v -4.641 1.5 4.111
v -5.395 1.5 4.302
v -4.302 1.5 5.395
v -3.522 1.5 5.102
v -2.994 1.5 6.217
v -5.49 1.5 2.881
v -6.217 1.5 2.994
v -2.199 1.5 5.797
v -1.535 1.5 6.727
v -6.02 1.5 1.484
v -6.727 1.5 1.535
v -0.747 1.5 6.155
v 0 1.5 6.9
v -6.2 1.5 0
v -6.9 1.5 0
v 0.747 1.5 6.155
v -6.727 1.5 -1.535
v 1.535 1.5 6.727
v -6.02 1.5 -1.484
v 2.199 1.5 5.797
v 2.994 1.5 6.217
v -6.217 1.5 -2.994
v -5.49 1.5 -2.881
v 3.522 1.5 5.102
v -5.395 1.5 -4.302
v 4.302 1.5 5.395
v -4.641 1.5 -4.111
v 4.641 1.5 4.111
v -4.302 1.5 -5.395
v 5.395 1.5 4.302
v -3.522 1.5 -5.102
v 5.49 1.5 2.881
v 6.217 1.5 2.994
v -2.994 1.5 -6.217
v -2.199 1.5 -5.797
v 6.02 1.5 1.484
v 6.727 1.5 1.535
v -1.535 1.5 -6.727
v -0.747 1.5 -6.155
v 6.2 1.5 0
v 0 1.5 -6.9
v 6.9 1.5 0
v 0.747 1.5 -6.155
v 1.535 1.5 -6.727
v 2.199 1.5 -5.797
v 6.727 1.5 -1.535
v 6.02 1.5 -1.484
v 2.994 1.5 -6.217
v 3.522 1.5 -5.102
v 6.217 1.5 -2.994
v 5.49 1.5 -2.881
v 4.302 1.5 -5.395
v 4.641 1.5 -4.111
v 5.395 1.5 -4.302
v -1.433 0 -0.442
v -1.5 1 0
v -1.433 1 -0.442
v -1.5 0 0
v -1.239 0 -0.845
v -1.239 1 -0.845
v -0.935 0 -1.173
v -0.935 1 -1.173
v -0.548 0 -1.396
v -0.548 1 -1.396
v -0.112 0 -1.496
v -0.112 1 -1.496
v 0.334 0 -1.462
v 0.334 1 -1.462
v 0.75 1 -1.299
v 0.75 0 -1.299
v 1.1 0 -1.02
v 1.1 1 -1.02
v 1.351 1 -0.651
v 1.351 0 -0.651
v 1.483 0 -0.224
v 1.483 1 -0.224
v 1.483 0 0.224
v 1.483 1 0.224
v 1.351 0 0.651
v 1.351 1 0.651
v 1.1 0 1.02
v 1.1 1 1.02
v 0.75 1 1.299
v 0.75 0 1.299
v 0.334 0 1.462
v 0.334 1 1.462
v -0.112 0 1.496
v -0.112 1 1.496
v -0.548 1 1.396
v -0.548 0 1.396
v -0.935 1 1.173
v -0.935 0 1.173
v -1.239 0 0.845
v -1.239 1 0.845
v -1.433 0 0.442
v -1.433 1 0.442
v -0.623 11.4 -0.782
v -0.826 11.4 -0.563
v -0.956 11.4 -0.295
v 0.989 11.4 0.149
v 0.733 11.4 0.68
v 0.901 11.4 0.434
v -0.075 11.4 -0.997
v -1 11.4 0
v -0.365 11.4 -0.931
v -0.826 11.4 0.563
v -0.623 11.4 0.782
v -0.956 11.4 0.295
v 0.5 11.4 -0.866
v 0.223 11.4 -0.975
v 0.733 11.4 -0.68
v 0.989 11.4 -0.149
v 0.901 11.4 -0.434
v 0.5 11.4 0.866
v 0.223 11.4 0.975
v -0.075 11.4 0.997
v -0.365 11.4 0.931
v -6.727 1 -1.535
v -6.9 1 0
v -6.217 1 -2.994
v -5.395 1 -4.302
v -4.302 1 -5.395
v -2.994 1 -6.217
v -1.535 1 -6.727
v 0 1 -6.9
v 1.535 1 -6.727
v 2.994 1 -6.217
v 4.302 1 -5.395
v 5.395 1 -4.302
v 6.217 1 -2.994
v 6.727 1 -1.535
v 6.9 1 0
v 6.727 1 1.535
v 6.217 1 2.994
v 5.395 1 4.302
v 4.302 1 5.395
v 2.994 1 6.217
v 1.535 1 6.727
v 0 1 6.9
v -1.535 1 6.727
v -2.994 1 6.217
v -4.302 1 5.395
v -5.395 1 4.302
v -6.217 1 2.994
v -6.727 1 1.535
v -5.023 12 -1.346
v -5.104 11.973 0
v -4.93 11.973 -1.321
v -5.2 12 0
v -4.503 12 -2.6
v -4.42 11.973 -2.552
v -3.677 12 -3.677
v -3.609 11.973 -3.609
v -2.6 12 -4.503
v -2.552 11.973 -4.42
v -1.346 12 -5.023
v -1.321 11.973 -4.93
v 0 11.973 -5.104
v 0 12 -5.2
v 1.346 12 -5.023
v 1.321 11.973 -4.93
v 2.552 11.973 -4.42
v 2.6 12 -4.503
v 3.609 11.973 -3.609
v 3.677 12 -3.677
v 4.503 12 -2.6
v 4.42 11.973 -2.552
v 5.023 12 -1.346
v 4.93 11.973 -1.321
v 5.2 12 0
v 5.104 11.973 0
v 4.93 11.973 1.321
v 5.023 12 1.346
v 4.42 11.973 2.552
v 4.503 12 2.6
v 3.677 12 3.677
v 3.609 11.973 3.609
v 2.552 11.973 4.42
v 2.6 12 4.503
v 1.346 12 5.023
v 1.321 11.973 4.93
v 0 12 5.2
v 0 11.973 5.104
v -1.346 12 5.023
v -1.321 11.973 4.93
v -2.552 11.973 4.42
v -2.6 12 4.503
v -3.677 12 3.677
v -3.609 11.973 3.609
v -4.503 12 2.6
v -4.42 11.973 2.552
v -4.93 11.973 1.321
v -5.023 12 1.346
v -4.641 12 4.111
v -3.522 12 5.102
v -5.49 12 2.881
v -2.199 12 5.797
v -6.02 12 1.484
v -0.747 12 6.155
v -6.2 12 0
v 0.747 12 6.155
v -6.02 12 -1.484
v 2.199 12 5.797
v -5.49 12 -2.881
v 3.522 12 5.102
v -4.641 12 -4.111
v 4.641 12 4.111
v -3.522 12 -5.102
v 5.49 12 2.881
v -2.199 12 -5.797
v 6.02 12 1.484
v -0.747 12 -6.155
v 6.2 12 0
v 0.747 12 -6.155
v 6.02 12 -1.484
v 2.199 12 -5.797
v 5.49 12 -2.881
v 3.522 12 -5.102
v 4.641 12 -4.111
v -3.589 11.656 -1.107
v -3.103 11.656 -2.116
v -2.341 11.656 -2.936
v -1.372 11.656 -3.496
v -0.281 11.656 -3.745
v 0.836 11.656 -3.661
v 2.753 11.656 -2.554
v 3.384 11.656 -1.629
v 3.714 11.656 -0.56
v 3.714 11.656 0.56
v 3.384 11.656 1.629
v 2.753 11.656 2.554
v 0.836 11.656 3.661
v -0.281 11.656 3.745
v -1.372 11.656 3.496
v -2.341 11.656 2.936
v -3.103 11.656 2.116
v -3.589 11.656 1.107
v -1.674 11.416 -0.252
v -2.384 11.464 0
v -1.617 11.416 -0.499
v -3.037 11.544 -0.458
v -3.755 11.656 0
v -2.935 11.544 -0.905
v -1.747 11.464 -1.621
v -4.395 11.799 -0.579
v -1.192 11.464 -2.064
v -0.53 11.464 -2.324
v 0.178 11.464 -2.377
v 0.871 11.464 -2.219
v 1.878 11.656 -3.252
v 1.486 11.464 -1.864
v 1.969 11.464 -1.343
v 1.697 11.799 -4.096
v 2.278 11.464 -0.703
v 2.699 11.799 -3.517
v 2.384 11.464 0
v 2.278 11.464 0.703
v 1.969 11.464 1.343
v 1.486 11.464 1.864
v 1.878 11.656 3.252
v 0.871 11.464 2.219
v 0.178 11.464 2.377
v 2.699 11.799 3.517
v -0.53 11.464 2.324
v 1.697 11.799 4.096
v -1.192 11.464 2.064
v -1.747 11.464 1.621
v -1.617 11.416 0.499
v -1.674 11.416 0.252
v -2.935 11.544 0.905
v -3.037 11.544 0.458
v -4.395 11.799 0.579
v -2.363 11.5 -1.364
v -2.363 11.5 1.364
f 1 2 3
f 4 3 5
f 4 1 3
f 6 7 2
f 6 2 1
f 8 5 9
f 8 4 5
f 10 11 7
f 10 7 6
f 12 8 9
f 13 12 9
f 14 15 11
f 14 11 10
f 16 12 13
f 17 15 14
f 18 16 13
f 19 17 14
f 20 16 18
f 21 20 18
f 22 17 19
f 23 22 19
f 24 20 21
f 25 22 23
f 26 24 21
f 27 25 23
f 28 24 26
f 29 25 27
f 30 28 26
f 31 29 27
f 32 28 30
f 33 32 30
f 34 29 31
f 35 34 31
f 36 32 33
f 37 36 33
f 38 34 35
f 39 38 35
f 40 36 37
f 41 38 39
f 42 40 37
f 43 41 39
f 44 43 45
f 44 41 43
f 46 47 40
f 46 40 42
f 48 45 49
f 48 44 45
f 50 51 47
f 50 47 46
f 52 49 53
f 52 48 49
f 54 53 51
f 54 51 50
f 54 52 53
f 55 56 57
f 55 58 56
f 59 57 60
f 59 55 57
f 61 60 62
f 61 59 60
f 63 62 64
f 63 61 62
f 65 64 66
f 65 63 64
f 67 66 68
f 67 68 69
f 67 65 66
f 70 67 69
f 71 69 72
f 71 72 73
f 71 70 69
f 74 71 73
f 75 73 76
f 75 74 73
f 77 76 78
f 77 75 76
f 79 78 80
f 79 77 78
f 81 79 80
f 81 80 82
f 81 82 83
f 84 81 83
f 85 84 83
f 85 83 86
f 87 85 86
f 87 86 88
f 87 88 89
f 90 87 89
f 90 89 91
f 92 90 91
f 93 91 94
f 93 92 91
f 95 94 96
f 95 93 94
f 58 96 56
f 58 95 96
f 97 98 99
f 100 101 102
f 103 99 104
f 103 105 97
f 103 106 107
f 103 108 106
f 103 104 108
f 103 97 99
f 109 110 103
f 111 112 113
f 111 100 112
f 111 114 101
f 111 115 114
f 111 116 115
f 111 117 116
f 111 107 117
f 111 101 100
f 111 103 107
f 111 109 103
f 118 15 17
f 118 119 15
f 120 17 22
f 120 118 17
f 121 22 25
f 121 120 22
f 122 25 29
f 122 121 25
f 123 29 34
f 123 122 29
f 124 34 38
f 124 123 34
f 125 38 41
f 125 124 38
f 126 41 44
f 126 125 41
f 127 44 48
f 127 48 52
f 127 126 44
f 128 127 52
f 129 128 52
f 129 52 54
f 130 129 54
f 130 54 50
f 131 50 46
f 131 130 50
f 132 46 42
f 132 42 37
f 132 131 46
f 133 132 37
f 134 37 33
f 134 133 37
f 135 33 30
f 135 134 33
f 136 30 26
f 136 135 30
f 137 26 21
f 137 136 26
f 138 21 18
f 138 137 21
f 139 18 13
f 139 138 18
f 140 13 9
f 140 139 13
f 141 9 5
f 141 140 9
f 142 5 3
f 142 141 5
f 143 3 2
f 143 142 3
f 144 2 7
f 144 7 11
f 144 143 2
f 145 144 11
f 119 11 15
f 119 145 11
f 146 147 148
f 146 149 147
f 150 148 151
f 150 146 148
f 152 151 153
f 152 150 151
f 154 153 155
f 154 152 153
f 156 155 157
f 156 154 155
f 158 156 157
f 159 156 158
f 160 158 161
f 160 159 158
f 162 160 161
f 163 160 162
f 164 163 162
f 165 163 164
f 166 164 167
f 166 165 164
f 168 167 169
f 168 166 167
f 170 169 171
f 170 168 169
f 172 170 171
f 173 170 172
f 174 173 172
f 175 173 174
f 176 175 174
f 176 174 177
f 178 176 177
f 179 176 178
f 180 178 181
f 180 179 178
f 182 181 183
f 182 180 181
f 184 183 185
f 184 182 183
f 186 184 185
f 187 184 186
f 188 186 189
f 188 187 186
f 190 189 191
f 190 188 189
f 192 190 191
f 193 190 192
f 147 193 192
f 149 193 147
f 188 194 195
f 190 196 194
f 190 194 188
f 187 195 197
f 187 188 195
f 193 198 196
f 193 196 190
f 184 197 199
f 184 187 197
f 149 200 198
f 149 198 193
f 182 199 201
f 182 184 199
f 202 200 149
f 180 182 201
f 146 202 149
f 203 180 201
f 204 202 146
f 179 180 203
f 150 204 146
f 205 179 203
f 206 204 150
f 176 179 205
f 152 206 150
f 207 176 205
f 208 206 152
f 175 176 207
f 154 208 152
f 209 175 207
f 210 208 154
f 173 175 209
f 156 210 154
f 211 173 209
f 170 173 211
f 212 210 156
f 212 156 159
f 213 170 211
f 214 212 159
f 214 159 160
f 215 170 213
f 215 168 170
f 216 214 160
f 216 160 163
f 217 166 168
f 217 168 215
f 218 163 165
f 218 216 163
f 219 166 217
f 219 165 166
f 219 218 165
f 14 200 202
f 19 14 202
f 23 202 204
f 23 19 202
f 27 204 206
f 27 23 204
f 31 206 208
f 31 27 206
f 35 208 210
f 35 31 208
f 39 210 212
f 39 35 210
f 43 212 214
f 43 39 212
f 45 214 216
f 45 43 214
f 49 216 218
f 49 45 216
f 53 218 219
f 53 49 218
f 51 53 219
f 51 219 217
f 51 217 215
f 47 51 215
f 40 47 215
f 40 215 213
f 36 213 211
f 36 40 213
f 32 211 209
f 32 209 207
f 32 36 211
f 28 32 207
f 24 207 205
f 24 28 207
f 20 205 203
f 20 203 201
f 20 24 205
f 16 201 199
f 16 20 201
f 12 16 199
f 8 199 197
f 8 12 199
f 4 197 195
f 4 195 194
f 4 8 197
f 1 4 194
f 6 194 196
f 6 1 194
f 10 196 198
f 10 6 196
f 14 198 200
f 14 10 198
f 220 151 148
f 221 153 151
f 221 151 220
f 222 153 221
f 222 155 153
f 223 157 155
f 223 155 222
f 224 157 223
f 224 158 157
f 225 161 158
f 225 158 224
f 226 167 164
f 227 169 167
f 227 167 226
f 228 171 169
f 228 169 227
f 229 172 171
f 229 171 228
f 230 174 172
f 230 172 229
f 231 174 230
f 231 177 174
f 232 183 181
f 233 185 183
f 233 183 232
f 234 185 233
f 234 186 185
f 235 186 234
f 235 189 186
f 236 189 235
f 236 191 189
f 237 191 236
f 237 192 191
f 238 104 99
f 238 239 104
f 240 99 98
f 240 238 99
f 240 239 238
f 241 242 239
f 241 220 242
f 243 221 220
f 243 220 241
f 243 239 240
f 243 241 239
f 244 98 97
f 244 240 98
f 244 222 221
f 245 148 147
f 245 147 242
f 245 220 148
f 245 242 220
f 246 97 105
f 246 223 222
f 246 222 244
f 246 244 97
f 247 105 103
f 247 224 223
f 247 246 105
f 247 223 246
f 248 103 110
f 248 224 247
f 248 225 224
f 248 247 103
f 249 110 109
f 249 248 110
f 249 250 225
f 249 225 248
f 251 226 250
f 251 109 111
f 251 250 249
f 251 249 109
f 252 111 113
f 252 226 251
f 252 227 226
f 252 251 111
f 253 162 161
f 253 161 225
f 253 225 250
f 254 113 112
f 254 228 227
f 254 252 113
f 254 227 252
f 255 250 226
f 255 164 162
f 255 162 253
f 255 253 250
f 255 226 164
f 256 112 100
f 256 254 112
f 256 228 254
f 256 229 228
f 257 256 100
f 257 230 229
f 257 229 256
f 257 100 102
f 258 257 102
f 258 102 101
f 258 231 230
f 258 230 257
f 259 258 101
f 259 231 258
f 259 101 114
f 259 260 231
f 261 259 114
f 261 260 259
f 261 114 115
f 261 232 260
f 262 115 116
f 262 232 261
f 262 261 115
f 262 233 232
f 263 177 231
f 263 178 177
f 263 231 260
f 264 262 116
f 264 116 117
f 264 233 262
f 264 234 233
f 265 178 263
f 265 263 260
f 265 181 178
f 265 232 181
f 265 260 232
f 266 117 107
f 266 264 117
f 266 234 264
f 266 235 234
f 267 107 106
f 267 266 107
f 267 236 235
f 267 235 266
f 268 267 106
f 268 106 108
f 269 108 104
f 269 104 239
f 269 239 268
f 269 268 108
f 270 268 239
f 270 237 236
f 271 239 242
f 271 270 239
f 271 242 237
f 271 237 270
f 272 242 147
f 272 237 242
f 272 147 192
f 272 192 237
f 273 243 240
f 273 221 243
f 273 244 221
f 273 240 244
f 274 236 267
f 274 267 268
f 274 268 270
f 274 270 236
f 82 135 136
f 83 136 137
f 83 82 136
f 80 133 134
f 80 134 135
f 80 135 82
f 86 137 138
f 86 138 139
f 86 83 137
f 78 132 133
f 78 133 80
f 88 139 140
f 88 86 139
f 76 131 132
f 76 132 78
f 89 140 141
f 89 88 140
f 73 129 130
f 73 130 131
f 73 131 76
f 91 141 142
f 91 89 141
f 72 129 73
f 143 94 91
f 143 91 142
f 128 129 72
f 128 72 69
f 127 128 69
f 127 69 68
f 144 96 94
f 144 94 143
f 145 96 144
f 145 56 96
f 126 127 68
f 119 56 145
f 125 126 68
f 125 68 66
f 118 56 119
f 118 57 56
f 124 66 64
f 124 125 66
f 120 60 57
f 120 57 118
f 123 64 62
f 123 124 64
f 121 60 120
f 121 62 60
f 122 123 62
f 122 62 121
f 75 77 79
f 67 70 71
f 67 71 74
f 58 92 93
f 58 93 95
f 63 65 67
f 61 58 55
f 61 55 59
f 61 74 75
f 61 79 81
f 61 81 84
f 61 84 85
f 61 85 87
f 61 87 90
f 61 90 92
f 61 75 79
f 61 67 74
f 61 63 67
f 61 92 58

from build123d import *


with BuildPart() as part:
    # Sketch 183 → Revolve1 (revolve)
    with BuildSketch(Plane.XY):
        with BuildLine():
            Line((-5.2, 12), (-6.2, 12))
            Line((-6.2, 12), (-6.2, 1.5))
            Line((-6.2, 1.5), (-6.9, 1.5))
            Line((-6.9, 1.5), (-6.9, 1))
            Line((-6.9, 1), (-6.2, 1))
            Line((-6.2, 1), (-1.5, 1))
            Line((-1.5, 1), (-1.5, 0))
            Line((-1.5, 0), (0, 0))
            Line((0, 0), (0, 11.400347218))
            Line((0, 11.400347218), (-1, 11.400347218))
            ThreePointArc((-1, 11.400347218), (-3.071763766, 11.544109643), (-5.103815293, 11.972641231))
            Line((-5.103815293, 11.972641231), (-5.2, 12))
        make_face()
    revolve(axis=Axis((0, 11.400347218, 0), (0, -1, 0)))


solid = part.part
